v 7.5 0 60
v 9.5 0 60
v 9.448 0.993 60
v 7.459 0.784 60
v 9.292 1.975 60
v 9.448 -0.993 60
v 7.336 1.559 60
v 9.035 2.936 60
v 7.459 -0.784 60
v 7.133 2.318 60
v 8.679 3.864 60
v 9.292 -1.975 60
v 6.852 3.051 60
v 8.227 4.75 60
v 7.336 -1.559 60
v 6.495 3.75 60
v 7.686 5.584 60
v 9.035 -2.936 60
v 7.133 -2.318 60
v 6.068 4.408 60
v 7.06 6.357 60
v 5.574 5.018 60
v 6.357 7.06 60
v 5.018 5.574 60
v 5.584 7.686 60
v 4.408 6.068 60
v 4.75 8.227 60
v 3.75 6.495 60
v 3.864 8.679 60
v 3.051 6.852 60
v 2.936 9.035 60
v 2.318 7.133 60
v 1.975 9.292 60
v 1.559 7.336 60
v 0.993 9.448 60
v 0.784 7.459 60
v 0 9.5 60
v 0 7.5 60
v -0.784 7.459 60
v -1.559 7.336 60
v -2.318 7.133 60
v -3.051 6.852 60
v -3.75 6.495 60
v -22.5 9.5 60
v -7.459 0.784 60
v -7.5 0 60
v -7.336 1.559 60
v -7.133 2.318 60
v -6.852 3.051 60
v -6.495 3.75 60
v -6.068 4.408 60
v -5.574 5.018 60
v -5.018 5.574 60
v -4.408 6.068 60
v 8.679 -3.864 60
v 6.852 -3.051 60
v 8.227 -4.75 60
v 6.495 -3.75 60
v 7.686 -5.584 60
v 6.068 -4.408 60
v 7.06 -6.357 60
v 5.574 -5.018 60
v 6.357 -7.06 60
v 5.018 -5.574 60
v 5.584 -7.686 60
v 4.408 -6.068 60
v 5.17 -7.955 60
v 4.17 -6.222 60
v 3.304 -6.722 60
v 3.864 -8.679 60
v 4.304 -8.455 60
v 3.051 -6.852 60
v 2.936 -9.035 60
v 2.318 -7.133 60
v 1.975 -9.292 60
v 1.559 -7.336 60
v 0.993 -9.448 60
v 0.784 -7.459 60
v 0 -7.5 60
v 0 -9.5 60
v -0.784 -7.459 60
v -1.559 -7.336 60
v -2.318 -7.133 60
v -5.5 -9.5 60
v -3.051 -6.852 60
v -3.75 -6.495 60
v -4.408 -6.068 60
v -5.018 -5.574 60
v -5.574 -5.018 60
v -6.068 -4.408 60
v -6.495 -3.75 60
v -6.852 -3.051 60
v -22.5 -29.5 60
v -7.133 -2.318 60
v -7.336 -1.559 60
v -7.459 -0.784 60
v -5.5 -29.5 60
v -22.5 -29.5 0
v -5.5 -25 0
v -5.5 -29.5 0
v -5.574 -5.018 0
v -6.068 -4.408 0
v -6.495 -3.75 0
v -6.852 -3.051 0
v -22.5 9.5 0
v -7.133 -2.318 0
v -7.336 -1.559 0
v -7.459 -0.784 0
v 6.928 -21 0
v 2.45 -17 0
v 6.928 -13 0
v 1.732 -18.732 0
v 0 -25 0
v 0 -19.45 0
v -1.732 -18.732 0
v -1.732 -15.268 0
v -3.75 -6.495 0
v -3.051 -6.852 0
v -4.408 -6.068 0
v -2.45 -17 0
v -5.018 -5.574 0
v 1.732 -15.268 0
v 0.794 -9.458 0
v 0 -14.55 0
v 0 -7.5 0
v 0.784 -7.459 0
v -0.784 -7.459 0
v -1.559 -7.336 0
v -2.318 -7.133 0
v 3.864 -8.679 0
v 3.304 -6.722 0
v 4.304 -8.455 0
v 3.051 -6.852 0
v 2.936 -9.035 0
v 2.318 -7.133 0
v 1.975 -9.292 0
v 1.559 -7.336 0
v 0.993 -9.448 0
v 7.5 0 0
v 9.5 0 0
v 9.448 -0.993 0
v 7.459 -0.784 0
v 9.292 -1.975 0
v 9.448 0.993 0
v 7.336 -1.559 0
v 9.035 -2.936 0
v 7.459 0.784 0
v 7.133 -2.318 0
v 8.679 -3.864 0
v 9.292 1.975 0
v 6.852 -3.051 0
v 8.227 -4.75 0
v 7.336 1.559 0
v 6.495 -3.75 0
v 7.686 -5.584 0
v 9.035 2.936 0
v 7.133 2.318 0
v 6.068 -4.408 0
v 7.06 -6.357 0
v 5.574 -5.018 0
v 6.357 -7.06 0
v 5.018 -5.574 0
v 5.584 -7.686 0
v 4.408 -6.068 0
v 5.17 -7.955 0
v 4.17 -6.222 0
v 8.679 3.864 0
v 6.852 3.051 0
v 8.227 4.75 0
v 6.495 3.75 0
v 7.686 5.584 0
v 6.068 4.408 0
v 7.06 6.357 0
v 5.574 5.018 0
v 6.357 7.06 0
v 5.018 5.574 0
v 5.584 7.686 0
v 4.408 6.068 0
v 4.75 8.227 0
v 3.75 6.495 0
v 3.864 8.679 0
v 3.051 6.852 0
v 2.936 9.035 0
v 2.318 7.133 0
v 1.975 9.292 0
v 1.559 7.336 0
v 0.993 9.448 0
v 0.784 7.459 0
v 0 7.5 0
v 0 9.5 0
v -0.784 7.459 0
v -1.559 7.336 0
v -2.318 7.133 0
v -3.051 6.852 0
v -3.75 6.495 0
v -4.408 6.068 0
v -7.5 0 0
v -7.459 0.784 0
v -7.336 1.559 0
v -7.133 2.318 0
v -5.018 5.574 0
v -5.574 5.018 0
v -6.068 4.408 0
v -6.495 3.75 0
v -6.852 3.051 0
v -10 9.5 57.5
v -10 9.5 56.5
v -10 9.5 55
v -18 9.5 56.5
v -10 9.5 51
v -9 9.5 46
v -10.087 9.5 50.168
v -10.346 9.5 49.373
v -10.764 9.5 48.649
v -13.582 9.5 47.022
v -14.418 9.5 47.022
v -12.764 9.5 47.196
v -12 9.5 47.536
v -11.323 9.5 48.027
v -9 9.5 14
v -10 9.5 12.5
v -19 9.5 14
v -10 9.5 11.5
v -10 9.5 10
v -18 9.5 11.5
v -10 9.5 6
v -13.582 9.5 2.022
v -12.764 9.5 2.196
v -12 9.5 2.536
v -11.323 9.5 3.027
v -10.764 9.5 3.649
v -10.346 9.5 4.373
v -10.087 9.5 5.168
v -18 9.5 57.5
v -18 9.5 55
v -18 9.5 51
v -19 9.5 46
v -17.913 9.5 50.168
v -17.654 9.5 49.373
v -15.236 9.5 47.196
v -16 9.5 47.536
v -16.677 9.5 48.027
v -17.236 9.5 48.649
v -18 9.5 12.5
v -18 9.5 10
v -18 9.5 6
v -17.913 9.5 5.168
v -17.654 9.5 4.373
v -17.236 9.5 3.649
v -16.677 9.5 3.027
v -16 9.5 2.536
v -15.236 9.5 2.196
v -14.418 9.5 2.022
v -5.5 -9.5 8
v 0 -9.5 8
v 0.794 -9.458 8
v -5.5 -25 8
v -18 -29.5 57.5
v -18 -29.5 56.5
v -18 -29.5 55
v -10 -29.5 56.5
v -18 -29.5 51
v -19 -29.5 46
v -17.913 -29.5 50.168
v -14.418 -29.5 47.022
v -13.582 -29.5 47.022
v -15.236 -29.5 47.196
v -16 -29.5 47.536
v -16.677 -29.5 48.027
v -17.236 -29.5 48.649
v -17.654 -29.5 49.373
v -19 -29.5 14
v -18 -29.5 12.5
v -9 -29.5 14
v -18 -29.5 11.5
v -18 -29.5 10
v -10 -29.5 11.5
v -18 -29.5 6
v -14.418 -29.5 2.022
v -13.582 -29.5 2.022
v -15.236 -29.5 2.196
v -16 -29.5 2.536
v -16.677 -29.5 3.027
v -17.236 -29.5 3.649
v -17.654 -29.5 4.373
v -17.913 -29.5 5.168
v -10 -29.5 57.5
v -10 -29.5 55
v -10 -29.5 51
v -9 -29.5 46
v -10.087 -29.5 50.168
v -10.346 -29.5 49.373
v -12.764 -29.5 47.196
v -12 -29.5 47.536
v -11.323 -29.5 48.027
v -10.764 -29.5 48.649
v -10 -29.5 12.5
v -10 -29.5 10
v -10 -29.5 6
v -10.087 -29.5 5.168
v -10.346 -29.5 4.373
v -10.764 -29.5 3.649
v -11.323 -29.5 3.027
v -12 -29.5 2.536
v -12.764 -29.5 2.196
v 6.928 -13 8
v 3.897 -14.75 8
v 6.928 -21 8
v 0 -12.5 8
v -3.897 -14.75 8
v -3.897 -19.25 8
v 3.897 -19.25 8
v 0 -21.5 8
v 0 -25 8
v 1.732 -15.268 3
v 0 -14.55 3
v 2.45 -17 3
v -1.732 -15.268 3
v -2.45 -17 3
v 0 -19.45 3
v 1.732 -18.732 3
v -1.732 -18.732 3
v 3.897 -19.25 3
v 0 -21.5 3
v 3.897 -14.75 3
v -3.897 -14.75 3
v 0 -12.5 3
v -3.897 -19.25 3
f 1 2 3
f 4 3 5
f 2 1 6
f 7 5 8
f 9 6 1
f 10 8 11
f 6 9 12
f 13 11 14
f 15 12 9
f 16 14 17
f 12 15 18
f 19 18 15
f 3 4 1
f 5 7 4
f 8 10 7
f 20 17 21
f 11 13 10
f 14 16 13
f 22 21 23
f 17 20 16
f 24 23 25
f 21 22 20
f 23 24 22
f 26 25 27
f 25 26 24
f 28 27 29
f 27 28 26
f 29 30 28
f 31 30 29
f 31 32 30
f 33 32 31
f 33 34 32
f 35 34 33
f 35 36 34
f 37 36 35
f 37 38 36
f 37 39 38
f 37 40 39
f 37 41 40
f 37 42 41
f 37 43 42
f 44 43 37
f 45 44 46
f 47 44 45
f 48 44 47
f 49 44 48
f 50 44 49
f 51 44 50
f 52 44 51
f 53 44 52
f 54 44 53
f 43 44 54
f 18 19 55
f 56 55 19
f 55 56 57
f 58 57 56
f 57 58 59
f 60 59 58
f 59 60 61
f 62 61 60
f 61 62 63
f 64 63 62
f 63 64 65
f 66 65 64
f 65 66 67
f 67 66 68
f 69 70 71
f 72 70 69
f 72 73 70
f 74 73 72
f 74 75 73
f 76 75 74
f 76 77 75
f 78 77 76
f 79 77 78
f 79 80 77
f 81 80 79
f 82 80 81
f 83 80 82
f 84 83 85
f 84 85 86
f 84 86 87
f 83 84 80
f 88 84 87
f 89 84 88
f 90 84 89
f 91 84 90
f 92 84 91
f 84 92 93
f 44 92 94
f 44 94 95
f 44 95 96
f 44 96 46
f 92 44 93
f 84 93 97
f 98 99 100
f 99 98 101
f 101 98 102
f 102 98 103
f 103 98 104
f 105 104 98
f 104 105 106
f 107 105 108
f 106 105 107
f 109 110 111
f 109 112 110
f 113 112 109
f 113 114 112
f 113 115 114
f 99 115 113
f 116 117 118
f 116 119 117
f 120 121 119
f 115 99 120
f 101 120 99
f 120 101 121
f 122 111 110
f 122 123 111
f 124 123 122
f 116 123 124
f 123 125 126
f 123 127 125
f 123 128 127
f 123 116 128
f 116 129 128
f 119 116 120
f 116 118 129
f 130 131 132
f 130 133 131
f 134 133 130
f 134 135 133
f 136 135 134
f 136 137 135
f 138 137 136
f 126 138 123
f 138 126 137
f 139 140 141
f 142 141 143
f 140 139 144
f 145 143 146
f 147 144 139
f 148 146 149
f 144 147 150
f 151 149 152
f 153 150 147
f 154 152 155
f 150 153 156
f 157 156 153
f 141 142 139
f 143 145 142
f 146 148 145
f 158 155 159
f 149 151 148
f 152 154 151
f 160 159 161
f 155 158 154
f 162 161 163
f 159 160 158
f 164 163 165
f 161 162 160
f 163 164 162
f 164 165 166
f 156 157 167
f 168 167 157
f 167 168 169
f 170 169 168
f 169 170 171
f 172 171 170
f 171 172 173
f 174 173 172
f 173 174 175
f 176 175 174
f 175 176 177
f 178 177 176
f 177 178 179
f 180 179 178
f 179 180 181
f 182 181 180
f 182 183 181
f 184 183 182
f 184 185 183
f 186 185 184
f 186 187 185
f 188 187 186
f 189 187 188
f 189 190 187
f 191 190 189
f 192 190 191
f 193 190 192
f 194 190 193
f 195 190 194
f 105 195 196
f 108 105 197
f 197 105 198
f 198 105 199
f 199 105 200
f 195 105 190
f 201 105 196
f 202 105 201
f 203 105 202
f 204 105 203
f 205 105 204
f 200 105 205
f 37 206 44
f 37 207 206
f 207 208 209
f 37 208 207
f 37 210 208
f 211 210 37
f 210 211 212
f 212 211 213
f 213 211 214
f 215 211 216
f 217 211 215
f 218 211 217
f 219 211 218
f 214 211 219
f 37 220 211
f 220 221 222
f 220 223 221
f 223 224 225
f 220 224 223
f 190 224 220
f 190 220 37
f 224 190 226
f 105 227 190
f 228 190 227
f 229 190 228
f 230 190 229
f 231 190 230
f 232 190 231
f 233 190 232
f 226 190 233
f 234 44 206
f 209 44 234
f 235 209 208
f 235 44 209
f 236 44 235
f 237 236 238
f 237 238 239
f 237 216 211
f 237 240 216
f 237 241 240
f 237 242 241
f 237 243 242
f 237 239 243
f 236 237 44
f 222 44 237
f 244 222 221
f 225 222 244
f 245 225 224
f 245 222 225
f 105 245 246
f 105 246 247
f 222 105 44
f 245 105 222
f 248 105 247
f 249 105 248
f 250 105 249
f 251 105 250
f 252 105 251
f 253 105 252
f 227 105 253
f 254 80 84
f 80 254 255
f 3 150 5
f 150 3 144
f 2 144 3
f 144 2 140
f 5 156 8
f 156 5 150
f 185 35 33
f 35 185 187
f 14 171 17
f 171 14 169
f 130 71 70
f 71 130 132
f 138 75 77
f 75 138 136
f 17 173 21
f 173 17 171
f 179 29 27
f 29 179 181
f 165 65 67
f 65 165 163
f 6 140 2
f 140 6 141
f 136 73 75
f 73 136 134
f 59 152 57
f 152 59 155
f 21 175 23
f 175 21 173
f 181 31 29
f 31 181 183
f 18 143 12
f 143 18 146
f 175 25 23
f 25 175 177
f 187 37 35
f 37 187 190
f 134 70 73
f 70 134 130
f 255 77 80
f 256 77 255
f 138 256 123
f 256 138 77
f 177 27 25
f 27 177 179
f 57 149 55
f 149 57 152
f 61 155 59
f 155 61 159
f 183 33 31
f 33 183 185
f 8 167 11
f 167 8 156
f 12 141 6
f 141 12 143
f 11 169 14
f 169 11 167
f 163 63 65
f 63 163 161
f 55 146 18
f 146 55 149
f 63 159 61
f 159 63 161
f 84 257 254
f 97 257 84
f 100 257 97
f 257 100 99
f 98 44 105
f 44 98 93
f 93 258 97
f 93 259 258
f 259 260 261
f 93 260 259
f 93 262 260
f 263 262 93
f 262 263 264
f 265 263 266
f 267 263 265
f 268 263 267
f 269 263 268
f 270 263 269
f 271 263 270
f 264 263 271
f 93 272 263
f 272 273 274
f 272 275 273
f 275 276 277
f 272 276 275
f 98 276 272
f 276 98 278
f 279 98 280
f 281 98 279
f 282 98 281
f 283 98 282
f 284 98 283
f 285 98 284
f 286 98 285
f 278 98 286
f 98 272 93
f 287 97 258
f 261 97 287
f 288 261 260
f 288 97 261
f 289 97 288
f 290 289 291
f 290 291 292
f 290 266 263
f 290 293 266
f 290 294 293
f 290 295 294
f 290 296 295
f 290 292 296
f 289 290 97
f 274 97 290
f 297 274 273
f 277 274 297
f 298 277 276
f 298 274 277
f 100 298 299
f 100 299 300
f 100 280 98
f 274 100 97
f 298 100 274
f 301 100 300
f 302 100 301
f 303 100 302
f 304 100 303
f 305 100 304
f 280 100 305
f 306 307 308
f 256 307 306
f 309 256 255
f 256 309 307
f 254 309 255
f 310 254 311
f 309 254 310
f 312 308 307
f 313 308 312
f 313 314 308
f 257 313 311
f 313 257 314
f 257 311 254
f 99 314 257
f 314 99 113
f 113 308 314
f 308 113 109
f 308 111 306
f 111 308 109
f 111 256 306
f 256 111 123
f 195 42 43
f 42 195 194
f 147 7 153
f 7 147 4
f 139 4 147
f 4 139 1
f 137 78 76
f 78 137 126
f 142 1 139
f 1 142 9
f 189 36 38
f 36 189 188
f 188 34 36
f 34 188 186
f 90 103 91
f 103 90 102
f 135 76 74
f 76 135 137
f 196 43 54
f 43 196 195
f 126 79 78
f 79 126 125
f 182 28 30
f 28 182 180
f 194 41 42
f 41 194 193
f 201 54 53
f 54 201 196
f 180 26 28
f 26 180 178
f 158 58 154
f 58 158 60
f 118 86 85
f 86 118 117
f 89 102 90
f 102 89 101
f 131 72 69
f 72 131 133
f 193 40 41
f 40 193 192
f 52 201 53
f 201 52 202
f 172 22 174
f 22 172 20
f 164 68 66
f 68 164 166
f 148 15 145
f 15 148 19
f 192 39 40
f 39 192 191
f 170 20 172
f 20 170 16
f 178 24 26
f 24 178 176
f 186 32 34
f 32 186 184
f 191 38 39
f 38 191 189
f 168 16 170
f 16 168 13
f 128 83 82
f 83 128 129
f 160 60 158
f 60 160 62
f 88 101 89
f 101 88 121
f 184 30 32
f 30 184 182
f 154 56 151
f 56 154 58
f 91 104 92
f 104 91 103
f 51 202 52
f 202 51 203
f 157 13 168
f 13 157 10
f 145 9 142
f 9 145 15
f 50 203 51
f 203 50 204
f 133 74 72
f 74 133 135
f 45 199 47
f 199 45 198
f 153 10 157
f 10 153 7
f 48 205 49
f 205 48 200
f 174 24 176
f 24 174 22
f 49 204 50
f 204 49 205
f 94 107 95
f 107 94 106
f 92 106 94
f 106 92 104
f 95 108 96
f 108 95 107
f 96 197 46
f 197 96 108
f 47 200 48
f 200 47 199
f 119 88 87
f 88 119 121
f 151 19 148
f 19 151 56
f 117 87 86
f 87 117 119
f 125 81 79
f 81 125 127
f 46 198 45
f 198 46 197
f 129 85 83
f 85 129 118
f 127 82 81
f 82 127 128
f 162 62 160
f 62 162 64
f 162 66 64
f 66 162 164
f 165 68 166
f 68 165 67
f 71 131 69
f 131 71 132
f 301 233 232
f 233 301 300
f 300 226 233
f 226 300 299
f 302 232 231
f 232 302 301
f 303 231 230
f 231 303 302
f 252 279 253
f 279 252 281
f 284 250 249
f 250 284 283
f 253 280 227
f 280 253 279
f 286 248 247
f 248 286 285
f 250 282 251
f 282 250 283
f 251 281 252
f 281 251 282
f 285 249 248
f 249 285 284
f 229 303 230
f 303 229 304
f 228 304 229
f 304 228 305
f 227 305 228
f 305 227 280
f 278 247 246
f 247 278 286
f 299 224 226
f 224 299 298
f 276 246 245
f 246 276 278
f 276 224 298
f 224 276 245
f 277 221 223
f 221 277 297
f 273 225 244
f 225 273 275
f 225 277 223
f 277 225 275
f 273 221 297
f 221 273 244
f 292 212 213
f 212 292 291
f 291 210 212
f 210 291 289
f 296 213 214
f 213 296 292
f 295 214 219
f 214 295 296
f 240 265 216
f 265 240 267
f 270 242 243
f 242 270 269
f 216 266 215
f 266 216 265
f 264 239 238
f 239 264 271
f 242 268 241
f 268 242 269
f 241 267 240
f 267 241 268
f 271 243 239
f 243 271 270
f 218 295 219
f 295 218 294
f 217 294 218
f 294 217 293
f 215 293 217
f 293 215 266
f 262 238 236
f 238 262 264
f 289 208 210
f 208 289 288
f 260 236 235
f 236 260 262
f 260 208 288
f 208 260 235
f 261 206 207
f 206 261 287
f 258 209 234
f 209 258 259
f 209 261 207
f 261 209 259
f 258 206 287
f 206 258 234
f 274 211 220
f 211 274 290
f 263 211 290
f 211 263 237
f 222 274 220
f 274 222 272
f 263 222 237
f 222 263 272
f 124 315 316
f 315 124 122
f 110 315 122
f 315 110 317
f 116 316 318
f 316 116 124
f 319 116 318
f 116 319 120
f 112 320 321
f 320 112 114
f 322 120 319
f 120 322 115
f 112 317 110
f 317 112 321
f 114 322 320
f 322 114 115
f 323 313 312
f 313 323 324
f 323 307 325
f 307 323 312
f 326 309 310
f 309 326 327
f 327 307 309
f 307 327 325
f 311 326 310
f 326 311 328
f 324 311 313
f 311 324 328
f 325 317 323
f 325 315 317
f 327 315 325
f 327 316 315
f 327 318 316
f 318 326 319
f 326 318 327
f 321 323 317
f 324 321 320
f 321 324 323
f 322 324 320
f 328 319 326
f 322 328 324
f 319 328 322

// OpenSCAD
// file: bearing.scad
// PRUSA iteration3
// Bearing holders
// GNU GPL v3
// Josef Průša <iam@josefprusa.cz> and contributors
// http://www.reprap.org/wiki/Prusa_Mendel
// http://prusamendel.org

//LM8UU
bearing_diameter = 15;
bearing_long = 24;
bearing_in = 8;

module horizontal_bearing_base(bearings=1){
 translate(v=[0,0,6]) cube(size = [24,8+bearings*bearing_long,12], center = true);	
}
module horizontal_bearing_holes(bearings=1){
 cutter_lenght = 10+bearings*bearing_long;
 one_holder_lenght = 8+bearing_long;
 holder_lenght = 8+bearings*bearing_long;
 
 // Main bearing cut
 difference(){
  translate(v=[0,0,12]) rotate(a=[90,0,0]) translate(v=[0,0,-cutter_lenght/2]) cylinder(h = cutter_lenght, r=bearing_diameter/2, $fn=50);
  // Bearing retainers
  translate(v=[0,1-holder_lenght/2,3]) cube(size = [24,6,2+(bearing_diameter-bearing_in)/2], center = true);
  translate(v=[0,-1+holder_lenght/2,3]) cube(size = [24,6,2+(bearing_diameter-bearing_in)/2], center = true);
 }
 
 // Ziptie cutouts
 ziptie_cut_ofset = 0;
 for ( i = [0 : bearings-1] ){
  // For easier positioning I move them by half of one 
  // bearing holder then add each bearign lenght and then center again
  translate(v=[0,-holder_lenght/2,0]) translate(v=[0,one_holder_lenght/2+i*25,0]) difference(){
   union(){
    translate(v=[0,2-6,12]) rotate(a=[90,0,0]) translate(v=[0,0,0]) cylinder(h = 4, r=12.5, $fn=50);
    translate(v=[0,2+6,12]) rotate(a=[90,0,0]) translate(v=[0,0,0]) cylinder(h = 4, r=12.5, $fn=50);
   }
   translate(v=[0,10,12]) rotate(a=[90,0,0]) translate(v=[0,0,0]) cylinder(h = 24, r=10, $fn=50);
  }
 }
 
}

module horizontal_bearing_test(){
 difference(){
  horizontal_bearing_base(1);
  horizontal_bearing_holes(1);
 }
 translate(v=[30,0,0]) difference(){
  horizontal_bearing_base(2);
  horizontal_bearing_holes(2);
 }
 translate(v=[60,0,0]) difference(){
  horizontal_bearing_base(3);
  horizontal_bearing_holes(3);
 }
}



thinwall = 2;
bearing_size = bearing_diameter + 2 * thinwall;

module vertical_bearing_base(){
 translate(v=[-2-bearing_size/4,0,30]) cube(size = [4+bearing_size/2,bearing_size,60], center = true);
 cylinder(h = 60, r=bearing_size/2, $fn = 60);
}

module vertical_bearing_holes(){
  translate(v=[0,0,-1]) cylinder(h = 62, r=bearing_diameter/2, $fn = 60);
  rotate(a=[0,0,-60]) translate(v=[10,0,31]) cube(size = [10,1,62], center = true);
}

difference(){
vertical_bearing_base();
vertical_bearing_holes();
}
// file: configuration.scad
x_rod_distance = 45;

// Select your belt type ******************************************************

//GT2
belt_tooth_distance = 2;
belt_tooth_ratio = 0.64;

//T2.5
//belt_tooth_distance = 2.5;
//belt_tooth_ratio = 0.5;

//T5 (strongly discouraged)
//belt_tooth_distance = 5;
//belt_tooth_ratio = 0.75;

//HTD3
//belt_tooth_distance = 3;
//belt_tooth_ratio = 0.75;

//MXL
//belt_tooth_distance = 2.032;
//belt_tooth_ratio = 0.64;

// Select your hot-end mount ******************************************************

// 0 = none; 1 = groove-mount (J-head/MakerGear etc.)
hotend_mount = 1;

hotend_groovemount_depth = 5;
hotend_groovemount_diameter = 16;
// main file
// PRUSA iteration3
// X end prototype
// GNU GPL v3
// Josef Průša <iam@josefprusa.cz> and contributors
// http://www.reprap.org/wiki/Prusa_Mendel
// http://prusamendel.org

include <configuration.scad>
use <bearing.scad>

module x_end_base(){
// Main block
translate(v=[-14,-10,30]) cube(size = [17,39,60], center = true);
// Bearing holder
vertical_bearing_base();	
//Nut trap
 // Cube
 translate(v=[-2-2,-17,4]) cube(size = [8,16,8], center = true);
 // Hexagon
 translate(v=[0,-17,0]) rotate([0,0,30]) cylinder(h = 8, r=8, $fn = 6);
}

module x_end_holes(){
vertical_bearing_holes();
// Belt hole
translate(v=[-5.5-10+1.5,-10,30]) cube(size = [10,56,32], center = true);
// Bottom pushfit rod
translate(v=[-14,-40,6]) rotate(a=[-90,0,0]) pushfit_rod(8,50);
// Top pushfit rod
translate(v=[-14,-40,x_rod_distance+6]) rotate(a=[-90,0,0]) pushfit_rod(8,50);
// Nut trap
 translate(v=[0,-17,-1]) cylinder(h = 10, r=2.45);
 translate(v=[0,-17,3]) rotate([0,0,30]) cylinder(h = 5, r=4.5, $fn = 6);
}


// Final prototype
module x_end_plain(){
 difference(){
  x_end_base();
  x_end_holes();
 }
}

x_end_plain();


module pushfit_rod(diameter,length){
 cylinder(h = length, r=diameter/2, $fn=30);
 translate(v=[0,-diameter/4,length/2]) cube(size = [diameter,diameter/2,length], center = true);
 translate(v=[0,-diameter/2-2,length/2]) cube(size = [diameter,1,length], center = true);
}
